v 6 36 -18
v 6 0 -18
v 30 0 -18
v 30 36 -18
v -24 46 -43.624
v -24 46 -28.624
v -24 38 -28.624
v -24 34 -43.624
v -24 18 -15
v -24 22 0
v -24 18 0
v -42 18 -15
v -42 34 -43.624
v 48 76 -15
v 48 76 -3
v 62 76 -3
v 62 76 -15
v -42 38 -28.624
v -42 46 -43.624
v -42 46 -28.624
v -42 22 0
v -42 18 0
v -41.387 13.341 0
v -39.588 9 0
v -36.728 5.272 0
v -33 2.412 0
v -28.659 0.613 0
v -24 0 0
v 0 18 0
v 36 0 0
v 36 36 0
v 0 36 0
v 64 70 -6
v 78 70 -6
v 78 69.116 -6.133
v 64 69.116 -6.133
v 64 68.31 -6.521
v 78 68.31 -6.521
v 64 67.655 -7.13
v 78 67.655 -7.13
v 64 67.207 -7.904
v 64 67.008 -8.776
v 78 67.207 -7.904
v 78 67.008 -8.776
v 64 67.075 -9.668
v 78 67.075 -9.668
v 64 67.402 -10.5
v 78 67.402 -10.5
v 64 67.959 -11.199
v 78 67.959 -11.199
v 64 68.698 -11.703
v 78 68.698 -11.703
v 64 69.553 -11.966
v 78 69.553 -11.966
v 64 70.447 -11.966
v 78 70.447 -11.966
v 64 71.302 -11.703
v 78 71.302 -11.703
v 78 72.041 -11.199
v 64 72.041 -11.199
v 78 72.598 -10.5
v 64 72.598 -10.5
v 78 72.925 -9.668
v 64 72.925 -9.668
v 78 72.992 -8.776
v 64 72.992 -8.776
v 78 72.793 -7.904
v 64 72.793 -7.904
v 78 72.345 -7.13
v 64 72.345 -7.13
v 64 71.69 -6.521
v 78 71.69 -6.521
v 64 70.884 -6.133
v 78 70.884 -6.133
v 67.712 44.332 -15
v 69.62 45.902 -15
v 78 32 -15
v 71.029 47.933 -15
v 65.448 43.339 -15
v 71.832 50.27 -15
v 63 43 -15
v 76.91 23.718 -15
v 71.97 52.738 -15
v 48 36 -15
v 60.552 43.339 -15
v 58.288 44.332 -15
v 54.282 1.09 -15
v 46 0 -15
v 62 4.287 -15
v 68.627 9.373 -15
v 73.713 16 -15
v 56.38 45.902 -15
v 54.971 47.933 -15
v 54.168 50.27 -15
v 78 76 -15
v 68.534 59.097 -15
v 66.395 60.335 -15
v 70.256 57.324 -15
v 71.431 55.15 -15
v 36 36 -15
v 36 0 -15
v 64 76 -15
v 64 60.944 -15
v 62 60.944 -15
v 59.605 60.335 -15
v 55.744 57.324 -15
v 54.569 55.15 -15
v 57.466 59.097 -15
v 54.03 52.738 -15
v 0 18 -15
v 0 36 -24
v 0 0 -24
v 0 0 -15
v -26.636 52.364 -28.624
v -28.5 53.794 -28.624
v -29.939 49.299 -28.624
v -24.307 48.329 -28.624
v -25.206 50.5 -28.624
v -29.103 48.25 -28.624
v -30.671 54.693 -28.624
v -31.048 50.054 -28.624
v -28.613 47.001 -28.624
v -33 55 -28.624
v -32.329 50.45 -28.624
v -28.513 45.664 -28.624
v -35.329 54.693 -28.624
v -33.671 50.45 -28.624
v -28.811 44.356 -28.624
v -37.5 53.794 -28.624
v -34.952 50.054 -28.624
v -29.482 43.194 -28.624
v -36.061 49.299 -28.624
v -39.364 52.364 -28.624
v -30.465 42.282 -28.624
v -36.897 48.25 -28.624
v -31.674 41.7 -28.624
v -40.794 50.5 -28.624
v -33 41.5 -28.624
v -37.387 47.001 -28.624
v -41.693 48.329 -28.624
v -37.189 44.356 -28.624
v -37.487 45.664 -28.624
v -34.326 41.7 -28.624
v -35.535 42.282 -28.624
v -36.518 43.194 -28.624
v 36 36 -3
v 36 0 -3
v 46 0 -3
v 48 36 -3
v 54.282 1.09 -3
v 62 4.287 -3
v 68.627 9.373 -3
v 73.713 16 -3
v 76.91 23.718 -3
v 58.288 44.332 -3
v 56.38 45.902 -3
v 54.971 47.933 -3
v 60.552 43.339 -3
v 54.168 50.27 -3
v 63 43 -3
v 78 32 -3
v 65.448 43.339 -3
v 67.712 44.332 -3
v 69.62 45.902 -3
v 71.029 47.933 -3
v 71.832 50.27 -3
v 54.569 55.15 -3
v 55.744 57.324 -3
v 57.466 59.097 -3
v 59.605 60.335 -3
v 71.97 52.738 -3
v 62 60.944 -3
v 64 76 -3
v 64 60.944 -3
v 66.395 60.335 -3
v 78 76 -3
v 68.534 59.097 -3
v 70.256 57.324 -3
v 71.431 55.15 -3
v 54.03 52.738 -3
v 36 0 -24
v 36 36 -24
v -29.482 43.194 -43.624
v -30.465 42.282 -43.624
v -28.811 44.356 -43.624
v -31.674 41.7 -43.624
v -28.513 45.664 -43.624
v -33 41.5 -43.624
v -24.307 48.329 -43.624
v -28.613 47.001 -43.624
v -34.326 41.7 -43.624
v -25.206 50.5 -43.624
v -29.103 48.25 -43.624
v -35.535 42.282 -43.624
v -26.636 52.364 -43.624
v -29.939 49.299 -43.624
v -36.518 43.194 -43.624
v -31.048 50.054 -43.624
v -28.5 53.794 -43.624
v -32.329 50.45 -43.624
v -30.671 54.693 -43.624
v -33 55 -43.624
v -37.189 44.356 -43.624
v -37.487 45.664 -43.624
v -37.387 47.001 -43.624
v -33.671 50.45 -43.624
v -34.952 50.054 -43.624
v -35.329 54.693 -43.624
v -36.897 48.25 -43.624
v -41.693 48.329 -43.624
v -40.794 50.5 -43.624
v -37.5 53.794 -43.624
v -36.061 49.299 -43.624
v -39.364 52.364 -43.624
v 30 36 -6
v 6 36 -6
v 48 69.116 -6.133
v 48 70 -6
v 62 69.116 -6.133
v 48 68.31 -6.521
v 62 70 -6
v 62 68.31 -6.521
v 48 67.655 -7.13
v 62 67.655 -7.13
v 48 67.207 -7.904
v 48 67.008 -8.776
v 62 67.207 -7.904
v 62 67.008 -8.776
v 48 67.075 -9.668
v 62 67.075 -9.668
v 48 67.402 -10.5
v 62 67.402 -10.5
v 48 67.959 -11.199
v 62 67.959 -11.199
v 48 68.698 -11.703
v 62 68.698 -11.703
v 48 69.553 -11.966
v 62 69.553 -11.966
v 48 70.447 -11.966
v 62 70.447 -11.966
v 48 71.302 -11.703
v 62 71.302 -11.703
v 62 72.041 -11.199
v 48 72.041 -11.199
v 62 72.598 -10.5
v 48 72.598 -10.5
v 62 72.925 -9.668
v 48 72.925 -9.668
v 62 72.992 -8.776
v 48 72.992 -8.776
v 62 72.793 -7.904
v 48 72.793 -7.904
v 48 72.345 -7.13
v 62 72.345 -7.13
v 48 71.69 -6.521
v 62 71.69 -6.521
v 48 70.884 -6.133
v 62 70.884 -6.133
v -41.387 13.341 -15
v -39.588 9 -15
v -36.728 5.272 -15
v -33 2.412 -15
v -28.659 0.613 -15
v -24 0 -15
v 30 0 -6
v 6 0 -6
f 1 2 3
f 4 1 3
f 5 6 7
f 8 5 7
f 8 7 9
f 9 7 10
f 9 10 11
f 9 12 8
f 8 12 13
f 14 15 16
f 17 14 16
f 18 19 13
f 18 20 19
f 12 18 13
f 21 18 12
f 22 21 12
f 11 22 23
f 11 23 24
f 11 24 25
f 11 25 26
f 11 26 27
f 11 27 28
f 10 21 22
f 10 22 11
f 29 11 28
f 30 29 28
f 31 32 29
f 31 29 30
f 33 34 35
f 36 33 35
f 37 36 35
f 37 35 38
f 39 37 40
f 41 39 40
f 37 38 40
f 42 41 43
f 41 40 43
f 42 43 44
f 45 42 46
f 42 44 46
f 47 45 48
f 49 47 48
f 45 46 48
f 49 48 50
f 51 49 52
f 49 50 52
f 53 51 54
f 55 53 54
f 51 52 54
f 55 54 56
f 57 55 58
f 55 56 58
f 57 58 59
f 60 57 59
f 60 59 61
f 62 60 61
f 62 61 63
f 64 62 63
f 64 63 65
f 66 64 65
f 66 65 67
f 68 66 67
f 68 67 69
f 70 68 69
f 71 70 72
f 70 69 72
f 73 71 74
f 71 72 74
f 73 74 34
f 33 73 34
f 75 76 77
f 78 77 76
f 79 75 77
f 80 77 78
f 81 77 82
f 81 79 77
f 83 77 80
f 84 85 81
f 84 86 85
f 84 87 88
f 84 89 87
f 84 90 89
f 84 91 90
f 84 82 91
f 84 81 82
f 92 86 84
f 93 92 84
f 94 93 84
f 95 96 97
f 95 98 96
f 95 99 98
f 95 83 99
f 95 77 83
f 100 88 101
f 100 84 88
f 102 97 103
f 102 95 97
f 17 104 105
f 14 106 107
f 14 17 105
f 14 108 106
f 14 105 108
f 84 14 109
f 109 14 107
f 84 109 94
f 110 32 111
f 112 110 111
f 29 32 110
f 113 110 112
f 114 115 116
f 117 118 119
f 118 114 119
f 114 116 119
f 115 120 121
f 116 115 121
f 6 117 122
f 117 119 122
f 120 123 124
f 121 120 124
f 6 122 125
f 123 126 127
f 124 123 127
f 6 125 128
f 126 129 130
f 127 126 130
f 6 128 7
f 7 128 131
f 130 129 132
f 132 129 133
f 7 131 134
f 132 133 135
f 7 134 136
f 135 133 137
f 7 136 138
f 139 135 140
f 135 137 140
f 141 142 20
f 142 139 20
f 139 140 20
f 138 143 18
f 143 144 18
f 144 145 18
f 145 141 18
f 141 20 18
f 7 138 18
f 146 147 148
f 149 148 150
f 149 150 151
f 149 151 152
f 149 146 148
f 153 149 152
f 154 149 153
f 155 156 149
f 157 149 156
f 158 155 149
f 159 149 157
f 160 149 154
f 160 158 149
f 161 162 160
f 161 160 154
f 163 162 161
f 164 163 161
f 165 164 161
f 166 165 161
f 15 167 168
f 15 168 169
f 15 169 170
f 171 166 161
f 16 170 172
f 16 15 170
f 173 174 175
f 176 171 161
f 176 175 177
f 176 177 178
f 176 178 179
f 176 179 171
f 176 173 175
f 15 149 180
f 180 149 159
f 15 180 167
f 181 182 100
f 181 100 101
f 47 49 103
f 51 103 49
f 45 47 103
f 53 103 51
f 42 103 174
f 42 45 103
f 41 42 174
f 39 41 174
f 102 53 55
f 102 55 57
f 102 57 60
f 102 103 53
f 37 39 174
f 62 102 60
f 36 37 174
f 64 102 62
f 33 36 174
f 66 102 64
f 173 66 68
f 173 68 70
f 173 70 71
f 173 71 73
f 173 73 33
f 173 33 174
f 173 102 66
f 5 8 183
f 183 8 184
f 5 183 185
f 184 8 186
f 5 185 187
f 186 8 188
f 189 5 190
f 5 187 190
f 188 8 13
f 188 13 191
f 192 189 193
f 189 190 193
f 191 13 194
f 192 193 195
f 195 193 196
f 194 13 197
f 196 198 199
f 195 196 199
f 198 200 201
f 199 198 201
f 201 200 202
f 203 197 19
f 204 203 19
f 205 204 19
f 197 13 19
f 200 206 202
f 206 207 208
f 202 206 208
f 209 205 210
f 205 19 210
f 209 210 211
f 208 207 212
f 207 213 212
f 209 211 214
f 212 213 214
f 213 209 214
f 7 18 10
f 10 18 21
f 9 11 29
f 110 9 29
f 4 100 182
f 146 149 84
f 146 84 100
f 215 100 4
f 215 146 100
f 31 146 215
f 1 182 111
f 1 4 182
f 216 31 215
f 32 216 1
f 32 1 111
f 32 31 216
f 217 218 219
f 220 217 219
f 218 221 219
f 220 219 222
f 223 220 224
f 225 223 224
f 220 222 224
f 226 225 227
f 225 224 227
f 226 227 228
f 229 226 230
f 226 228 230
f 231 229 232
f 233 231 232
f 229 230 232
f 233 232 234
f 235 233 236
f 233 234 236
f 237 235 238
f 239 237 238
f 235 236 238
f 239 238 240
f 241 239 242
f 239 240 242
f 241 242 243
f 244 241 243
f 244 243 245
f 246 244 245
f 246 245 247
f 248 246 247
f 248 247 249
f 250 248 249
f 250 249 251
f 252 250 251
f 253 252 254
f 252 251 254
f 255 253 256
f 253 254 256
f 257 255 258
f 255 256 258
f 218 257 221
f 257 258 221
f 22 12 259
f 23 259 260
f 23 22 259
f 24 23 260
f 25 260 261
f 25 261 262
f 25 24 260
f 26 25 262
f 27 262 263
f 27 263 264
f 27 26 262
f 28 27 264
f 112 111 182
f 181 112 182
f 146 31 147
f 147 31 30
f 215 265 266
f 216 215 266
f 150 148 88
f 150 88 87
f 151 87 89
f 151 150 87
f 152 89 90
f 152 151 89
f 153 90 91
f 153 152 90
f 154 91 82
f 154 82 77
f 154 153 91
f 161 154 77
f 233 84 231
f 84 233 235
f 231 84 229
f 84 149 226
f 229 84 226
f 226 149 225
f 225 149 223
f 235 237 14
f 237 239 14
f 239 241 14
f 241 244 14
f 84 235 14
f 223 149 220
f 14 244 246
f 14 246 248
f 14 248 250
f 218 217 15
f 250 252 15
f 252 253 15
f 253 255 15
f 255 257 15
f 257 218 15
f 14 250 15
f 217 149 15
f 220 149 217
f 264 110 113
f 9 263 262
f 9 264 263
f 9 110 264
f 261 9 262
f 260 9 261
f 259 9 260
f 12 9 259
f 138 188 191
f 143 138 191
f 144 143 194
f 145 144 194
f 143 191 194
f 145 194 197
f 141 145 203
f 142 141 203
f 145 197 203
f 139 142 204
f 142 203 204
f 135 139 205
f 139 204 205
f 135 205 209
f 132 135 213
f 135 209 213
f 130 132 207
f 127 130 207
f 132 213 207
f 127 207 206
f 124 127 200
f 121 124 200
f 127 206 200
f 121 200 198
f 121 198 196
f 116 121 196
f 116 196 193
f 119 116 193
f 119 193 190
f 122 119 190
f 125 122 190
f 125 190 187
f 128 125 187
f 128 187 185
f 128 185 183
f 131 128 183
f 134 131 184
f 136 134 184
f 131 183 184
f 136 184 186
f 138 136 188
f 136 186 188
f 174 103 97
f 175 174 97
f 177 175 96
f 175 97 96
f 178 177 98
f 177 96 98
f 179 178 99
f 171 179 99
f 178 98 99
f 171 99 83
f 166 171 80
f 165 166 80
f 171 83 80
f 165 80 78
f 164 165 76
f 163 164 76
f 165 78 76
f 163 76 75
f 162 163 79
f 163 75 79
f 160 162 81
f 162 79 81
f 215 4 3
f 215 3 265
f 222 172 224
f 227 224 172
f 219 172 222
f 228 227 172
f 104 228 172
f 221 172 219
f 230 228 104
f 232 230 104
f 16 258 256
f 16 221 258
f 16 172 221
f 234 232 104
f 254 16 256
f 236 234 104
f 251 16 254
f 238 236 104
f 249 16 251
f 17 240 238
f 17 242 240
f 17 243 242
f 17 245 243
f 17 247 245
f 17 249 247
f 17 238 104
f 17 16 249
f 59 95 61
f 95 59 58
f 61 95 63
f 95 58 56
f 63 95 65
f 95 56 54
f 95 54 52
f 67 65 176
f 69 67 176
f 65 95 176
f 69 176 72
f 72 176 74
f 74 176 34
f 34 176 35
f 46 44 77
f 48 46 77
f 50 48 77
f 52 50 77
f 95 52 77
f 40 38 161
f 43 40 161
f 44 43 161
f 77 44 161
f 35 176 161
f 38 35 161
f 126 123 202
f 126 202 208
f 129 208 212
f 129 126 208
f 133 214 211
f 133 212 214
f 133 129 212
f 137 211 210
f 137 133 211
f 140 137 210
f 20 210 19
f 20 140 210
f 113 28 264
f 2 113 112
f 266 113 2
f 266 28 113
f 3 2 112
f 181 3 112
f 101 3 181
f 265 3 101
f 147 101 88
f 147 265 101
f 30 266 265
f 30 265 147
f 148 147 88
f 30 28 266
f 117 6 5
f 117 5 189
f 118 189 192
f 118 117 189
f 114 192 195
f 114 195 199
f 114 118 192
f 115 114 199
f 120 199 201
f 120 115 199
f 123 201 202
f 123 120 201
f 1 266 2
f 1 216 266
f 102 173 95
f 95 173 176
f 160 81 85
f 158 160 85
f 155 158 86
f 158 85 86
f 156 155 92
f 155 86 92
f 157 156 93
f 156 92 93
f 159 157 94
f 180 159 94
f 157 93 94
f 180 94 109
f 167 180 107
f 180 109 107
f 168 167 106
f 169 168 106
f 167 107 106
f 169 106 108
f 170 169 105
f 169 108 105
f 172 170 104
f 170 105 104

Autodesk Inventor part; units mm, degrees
ref_plane "YZ Plane" through (0, 0, 0) normal (1, 0, 0) x (0, 1, 0)
ref_plane "XZ Plane" through (0, 0, 0) normal (0, 1, 0) x (-1, 0, 0)
ref_plane "XY Plane" through (0, 0, 0) normal (0, 0, 1) x (1, 0, 0)
sketch "Szkic1" plane through (0, 0, 0) normal (0, 0, 1) x (1, 0, 0)
  line L0 (0, 0) -> (36, 0)
  line L1 (36, 0) -> (36, 36)
  line L2 (36, 36) -> (0, 36)
  line L3 (0, 36) -> (0, 0)
  line L4 (0, 0) -> (-24, 0)
  line L5 (-42, 18) -> (-42, 18)
  line L6 (-42, 18) -> (0, 18)
  line L7 (0, 18) -> (0, 0)
  line L8 (36, 36) -> (78, 36)
  line L9 (78, 36) -> (78, 32)
  line L10 (46, 0) -> (36, 0)
  line L11 (36, 0) -> (36, 36)
  line L12 (78, 36) -> (48, 36)
  line L13 (48, 36) -> (48, 76)
  line L14 (48, 76) -> (78, 76)
  line L15 (78, 76) -> (78, 36)
  arc A0 (46, 0) -> (78, 32) centre (46, 32) ccw
  arc A1 (-42, 18) -> (-24, 0) centre (-24, 18) ccw
  point P0 (-42, 0)
  point P1 (78, 0)
  dimension "d0" = 36
  dimension "d1" = 36
  dimension "d2" = 42
  dimension "d3" = 18
  dimension "d4" = 42
  dimension "d5" = 30
  dimension "d6" = 40
  dimension "d7" = 32
  dimension "d8" = 18
extrude "Wyciągnięcie proste1" add sketch "Szkic1" against normal blind 24
sketch "Szkic2" plane through (0, 0, 0) normal (0, 0, 1) x (1, 0, 0)
  line L0 (78, 76) -> (78, 32) projected
  line L1 (46, 0) -> (-24, 0) projected
  line L2 (78, 76) -> (36, 76)
  line L3 (36, 76) -> (36, 0)
  line L4 (36, 0) -> (78, 0)
  line L5 (78, 0) -> (78, 76)
  point P0 (0, 0)
extrude "Wyciągnięcie proste2" cut sketch "Szkic2" against normal blind 3
sketch "Szkic3" plane through (0, 0, -24) normal (0, 0, -1) x (-1, 0, 0)
  line L0 (-48, 76) -> (-78, 76) projected
  line L1 (-46, 0) -> (-36, 0) projected
  line L2 (-78, 76) -> (-36, 76)
  line L3 (-36, 76) -> (-36, 0)
  line L4 (-36, 0) -> (-78, 0)
  line L5 (-78, 0) -> (-78, 76)
  line L6 (0, 36) -> (0, 18) projected
  line L7 (0, 36) -> (42, 36)
  line L8 (42, 36) -> (42, 0)
  line L9 (42, 0) -> (0, 0)
  line L10 (0, 0) -> (0, 36)
  point P0 (0, 0)
extrude "Wyciągnięcie proste3" cut sketch "Szkic3" against normal blind 9 contours L2 L3 L1 L4 L5 L0
sketch "Szkic4" plane through (0, 0, -24) normal (0, 0, -1) x (-1, 0, 0)
  line L0 (42, 18) -> (0, 18) projected
  line L1 (0, 0) -> (42, 0)
  line L2 (42, 0) -> (42, 18)
  line L3 (42, 18) -> (0, 18)
  line L4 (0, 18) -> (0, 0)
extrude "Wyciągnięcie proste4" cut sketch "Szkic4" against normal blind 9
ref_plane "Płaszczyzna konstrukcyjna1" through (-42, 18, 0) normal (-1, 0, 0) x (0, -1, 0)
sketch "Szkic5" plane through (-42, 18, 0) normal (-1, 0, 0) x (0, -1, 0)
  line L0 (0, 0) -> (0, -15) projected
  line L1 (-18, -15) -> (18, -15) projected
  line L2 (0, -15) -> (-16, -43.6236)
  line L3 (-16, -43.6236) -> (-37, -43.6236)
  line L4 (-37, -43.6236) -> (-37, -28.6236)
  line L5 (-37, -28.6236) -> (-20, -28.6236)
  line L6 (-20, -28.6236) -> (-4, 0)
  line L7 (-18, 0) -> (0, 0) projected
  line L8 (0, 0) -> (0, -15)
  point P0 (18, 0)
  point P1 (-28.5, -28.6236)
  dimension "d17" = 16
  dimension "d18" = 15
  dimension "d19" = 4
  dimension "d20" = 16
  dimension "d21" = 21
extrude "Wyciągnięcie proste5" add sketch "Szkic5" against normal blind 18
full round fillet "Zaokrąglenie pełne1" first side at (-24, 26, -14.5412) centre faces at (-36, 55, -33.6236) second side at (-42, 26, -14.5412)
sketch "Szkic6" plane through (-42, 38, -28.6236) normal (0, 0, 1) x (1, 0, 0)
  arc A0 (18, 8) -> (0, 8) centre (9, 8) ccw projected
  point P0 (42, -38)
hole "Otwór1" at (-33, 46, -28.6236) direction (0, 0, -1) diameter 9 end through all
sketch "Szkic7" plane through (48, 36, -3) normal (-1, 0, 0) x (0, 0, 1)
  point P0 (3, -36)
  point P1 (-6, 34)
hole "Otwór2" at (48, 70, -9) direction (1, 0, 0) diameter 6 end through all
sketch "Szkic8" plane through (0, 0, -3) normal (0, 0, 1) x (1, 0, 0)
  point P0 (0, 0)
  point P1 (63, 52)
hole "Otwór3" at (63, 52, -3) direction (0, 0, -1) diameter 18 end through all
sketch "Szkic9" plane through (48, 76, -3) normal (0, 1, 0) x (1, 0, 0)
  line L0 (0, 0) -> (30, 0) projected
  line L1 (14, 12) -> (16, 12)
  line L2 (16, 12) -> (16, 0)
  line L3 (16, 0) -> (14, 0)
  line L4 (14, 0) -> (14, 12)
  line L5 (30, 0) -> (30, 12) projected
  point P0 (-48, -3)
  point P1 (14, 0)
  dimension "d45" = 2
  dimension "d46" = 14
extrude "Wyciągnięcie proste6" cut sketch "Szkic9" against normal up to surface
sketch "Szkic10" plane through (0, 36, 0) normal (0, 1, 0) x (1, 0, 0)
  line L0 (6, 18) -> (30, 18)
  line L1 (30, 18) -> (30, 6)
  line L2 (30, 6) -> (6, 6)
  line L3 (6, 6) -> (6, 18)
  line L4 (0, 24) -> (36, 24) projected
  line L5 (0, 0) -> (0, 24) projected
  point P0 (6, 12)
  dimension "d49" = 24
  dimension "d50" = 12
  dimension "d51" = 6
  dimension "d52" = 6
extrude "Wyciągnięcie proste7" cut sketch "Szkic10" against normal through all
